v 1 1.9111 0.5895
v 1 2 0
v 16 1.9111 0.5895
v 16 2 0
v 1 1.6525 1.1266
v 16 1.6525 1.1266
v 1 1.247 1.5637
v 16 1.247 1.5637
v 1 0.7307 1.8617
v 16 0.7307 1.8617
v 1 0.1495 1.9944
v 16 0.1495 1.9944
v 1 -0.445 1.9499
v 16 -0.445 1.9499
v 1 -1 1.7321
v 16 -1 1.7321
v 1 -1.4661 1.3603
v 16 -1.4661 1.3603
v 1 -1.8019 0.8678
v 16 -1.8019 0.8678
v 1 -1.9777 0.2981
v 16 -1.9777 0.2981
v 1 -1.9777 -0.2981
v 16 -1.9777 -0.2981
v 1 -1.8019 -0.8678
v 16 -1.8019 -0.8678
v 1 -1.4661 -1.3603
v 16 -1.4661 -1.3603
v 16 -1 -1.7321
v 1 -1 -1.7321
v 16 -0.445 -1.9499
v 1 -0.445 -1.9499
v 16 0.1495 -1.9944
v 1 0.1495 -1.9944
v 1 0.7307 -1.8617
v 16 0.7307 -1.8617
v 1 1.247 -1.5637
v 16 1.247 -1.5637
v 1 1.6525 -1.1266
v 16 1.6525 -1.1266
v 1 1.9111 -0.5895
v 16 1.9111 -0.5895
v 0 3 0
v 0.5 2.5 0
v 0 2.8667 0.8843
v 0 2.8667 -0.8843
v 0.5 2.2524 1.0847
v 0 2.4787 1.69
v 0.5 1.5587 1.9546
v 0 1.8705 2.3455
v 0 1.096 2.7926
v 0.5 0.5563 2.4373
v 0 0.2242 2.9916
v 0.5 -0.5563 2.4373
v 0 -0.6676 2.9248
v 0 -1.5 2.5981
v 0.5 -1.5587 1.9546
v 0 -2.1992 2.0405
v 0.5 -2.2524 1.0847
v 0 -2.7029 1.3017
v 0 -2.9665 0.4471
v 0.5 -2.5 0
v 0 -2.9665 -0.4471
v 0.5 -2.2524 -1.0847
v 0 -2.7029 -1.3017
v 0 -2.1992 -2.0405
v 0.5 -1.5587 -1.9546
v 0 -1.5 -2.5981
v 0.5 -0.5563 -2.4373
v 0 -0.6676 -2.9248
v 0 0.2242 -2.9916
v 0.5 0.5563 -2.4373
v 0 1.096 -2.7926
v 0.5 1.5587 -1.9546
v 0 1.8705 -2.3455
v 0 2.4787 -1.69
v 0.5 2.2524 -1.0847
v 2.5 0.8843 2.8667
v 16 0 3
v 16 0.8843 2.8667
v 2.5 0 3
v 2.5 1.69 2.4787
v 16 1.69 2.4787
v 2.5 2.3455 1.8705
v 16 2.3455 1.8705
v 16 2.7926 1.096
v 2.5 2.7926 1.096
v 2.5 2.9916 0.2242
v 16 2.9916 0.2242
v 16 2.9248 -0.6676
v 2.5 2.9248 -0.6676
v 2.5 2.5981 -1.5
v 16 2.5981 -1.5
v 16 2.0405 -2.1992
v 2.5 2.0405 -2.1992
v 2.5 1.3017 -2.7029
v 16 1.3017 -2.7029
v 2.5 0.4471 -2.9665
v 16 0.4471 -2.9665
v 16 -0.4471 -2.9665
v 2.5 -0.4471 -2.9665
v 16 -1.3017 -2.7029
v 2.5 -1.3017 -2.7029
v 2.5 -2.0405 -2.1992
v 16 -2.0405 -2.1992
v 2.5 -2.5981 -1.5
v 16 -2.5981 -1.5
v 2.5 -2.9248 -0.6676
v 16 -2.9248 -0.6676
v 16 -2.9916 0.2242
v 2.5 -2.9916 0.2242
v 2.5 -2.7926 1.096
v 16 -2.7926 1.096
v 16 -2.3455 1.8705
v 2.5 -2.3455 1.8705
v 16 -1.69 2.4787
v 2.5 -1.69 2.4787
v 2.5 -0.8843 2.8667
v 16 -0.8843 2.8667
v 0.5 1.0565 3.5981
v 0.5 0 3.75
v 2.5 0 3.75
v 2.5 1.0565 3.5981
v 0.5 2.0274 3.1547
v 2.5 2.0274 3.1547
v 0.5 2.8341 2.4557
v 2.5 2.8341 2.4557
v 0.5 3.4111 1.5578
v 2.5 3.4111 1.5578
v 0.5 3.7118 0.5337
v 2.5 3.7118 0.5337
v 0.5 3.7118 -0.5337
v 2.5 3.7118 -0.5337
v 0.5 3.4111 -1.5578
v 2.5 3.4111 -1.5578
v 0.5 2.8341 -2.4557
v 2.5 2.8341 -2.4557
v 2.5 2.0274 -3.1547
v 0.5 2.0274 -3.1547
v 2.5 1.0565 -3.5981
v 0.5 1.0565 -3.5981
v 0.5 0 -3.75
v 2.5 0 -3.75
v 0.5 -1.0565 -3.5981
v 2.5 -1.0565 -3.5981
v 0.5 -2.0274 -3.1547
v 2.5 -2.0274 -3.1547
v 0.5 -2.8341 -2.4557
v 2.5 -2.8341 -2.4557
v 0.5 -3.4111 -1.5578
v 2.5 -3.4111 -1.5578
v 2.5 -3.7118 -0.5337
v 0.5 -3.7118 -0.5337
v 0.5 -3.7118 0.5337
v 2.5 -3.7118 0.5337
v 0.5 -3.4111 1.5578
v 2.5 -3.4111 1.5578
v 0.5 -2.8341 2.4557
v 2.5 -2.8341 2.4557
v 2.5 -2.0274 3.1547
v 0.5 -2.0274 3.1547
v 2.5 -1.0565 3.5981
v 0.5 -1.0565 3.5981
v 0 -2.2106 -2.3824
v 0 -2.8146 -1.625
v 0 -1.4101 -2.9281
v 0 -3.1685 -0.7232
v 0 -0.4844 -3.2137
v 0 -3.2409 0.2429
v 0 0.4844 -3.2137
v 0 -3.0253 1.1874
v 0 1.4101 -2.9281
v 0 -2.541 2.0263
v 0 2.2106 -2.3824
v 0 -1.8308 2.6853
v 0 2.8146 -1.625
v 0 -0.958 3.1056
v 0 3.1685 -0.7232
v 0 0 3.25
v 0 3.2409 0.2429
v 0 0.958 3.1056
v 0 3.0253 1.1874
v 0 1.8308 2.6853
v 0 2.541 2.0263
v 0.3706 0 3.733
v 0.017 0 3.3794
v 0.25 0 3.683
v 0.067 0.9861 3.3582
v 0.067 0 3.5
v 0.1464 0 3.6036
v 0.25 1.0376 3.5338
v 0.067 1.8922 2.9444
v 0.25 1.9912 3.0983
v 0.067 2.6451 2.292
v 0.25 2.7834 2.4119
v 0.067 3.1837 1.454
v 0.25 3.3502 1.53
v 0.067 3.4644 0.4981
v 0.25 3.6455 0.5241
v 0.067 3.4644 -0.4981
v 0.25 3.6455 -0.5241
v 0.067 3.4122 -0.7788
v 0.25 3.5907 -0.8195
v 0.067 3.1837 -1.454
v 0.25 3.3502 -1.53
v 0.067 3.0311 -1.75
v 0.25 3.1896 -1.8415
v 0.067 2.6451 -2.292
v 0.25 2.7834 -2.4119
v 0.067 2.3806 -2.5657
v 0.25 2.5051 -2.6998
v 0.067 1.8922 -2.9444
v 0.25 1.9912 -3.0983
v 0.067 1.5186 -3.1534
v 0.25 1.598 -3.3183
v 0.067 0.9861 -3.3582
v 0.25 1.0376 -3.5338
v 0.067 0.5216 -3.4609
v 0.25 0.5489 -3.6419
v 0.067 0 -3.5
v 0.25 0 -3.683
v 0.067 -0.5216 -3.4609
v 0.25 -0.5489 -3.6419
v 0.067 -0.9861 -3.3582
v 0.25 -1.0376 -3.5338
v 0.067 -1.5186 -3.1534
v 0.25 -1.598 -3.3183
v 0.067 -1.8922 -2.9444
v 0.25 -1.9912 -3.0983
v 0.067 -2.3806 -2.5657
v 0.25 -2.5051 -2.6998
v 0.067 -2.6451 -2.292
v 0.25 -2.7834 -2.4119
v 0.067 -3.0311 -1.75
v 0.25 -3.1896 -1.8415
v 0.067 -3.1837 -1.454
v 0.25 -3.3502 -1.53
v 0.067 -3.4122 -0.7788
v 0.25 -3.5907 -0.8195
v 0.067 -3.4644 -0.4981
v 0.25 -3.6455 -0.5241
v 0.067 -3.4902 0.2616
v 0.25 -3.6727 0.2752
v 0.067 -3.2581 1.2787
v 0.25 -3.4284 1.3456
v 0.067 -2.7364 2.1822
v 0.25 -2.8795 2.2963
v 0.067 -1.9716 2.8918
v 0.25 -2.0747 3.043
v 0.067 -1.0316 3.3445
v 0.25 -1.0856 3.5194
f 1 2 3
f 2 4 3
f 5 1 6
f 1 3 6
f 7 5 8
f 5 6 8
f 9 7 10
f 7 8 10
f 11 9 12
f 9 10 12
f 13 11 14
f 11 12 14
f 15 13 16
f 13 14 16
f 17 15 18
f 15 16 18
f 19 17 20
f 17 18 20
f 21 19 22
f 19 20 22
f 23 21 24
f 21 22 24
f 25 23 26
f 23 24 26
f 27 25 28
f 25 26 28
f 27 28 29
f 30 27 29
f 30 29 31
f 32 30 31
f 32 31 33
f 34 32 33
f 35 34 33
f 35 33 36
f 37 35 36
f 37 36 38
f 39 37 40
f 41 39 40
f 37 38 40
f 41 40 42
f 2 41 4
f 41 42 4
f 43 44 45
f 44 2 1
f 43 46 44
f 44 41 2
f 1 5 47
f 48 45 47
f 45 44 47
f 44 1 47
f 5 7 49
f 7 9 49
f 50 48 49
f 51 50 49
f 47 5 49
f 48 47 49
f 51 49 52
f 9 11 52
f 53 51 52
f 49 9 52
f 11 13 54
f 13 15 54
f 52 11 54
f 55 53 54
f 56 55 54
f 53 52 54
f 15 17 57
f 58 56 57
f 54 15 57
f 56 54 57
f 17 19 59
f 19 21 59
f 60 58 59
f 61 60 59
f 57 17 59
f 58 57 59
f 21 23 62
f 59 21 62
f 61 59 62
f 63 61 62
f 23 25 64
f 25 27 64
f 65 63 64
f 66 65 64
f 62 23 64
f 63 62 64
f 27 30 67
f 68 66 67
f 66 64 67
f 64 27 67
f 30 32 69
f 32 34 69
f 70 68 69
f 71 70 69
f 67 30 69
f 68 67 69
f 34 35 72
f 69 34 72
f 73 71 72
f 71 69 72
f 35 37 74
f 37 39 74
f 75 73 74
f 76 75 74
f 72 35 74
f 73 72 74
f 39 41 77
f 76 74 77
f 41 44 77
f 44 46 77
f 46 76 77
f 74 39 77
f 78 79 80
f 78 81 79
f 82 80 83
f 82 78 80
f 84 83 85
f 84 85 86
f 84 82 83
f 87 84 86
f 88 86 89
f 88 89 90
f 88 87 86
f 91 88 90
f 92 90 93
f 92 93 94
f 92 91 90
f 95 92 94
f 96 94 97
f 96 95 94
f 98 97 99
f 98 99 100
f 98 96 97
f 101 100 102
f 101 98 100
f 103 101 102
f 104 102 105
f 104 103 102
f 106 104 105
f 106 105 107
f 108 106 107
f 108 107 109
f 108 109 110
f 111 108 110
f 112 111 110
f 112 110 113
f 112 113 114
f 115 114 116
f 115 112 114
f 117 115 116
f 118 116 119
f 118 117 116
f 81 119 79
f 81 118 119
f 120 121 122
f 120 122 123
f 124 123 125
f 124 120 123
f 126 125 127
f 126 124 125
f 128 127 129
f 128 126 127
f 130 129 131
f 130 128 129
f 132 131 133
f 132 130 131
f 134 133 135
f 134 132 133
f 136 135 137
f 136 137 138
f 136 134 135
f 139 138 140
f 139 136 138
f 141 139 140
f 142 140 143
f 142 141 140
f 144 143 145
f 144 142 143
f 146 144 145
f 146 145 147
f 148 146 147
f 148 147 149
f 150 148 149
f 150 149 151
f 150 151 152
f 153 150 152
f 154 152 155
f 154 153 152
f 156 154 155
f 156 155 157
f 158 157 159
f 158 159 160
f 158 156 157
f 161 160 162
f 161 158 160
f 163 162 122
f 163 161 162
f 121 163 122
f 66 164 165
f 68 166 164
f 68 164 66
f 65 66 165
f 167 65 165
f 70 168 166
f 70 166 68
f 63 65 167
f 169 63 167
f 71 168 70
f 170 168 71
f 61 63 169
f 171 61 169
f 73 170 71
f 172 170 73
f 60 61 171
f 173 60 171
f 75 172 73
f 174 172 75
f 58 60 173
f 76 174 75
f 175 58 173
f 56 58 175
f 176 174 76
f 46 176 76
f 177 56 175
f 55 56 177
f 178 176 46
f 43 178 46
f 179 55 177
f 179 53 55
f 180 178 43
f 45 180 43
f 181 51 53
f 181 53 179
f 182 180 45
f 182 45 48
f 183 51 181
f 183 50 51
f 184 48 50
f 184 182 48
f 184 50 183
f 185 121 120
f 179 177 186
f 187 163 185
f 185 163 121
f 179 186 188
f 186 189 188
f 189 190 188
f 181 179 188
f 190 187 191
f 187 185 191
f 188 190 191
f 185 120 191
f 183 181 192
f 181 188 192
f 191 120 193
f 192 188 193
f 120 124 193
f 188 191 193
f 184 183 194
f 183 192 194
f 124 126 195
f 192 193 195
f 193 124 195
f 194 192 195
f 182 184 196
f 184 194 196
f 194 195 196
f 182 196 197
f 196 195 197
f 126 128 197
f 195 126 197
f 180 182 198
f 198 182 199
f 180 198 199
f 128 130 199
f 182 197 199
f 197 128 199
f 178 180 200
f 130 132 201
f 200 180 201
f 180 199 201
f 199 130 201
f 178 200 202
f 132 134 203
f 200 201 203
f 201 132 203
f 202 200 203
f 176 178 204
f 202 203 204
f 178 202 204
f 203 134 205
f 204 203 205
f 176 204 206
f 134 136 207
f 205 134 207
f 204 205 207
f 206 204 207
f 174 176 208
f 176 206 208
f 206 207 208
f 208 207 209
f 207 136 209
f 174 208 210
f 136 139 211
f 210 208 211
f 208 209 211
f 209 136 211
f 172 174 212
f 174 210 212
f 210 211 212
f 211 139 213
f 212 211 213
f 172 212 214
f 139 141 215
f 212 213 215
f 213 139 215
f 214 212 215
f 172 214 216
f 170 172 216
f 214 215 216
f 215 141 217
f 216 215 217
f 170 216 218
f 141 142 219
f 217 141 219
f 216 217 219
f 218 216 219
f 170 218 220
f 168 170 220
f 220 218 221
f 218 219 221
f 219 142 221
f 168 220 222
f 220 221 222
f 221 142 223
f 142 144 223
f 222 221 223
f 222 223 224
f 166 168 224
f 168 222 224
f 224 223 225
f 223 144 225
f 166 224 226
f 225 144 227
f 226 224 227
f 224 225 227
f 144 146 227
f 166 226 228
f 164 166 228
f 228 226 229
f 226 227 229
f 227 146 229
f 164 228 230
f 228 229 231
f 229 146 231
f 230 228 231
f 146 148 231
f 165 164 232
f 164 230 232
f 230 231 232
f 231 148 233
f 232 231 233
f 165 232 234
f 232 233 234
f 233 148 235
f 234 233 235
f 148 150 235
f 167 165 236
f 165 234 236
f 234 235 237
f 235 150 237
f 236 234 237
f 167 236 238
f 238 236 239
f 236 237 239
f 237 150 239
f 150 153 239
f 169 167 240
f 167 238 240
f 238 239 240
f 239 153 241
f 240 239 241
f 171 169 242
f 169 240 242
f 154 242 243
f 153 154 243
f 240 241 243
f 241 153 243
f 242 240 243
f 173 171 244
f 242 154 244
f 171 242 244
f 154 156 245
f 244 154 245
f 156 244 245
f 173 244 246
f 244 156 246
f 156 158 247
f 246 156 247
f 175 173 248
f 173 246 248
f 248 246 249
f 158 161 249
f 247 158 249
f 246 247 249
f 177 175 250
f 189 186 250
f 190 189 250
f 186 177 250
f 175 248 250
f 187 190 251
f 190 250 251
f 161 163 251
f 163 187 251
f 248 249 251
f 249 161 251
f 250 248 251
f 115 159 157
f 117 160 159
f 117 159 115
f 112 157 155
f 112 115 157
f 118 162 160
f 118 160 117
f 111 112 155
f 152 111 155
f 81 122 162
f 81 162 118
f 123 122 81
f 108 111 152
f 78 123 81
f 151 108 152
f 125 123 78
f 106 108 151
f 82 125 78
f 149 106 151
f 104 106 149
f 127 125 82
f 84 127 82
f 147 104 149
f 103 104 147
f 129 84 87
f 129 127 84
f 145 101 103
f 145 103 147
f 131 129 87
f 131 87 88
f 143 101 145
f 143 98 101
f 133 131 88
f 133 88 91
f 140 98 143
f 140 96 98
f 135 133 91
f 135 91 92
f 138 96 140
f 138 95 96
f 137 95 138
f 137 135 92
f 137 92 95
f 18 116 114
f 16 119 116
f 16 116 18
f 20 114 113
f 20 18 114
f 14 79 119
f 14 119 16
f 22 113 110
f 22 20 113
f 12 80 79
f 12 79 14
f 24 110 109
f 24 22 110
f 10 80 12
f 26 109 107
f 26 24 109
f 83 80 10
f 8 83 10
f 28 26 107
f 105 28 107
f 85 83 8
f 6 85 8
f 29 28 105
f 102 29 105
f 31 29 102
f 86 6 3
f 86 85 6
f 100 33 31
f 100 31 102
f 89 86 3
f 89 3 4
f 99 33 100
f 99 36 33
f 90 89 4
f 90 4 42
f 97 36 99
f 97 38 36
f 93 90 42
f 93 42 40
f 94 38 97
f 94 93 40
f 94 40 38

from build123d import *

# Parameters (mm, degrees)
F2_R           = 0.5
F4_D           = 4
F4_CSINK_D     = 6
F4_CSINK_ANGLE = 90


with BuildPart() as f1:
    # F0 (on Front) → F1 (revolve)
    with BuildSketch(Plane.XZ):
        Polygon((0, 3.75), (0, 0), (16, 0), (16, 3), (2.5, 3), (2.5, 3.75), align=None)
    revolve(axis=Axis((8, 0, 0), (-1, 0, 0)))

    # F2
    f2_edges = [f1.edges().sort_by_distance(p)[0] for p in [
        (0, 0, -3.75),
    ]]
    fillet(f2_edges, radius=F2_R)

    # F4 (through all)
    with Locations(Plane(origin=(0, 0, 0), x_dir=(0, -1, 0), z_dir=(-1, 0, 0))):
        with Locations((0, 0)):
            CounterSinkHole(F4_D / 2, F4_CSINK_D / 2, counter_sink_angle=F4_CSINK_ANGLE)


solid = f1.part
